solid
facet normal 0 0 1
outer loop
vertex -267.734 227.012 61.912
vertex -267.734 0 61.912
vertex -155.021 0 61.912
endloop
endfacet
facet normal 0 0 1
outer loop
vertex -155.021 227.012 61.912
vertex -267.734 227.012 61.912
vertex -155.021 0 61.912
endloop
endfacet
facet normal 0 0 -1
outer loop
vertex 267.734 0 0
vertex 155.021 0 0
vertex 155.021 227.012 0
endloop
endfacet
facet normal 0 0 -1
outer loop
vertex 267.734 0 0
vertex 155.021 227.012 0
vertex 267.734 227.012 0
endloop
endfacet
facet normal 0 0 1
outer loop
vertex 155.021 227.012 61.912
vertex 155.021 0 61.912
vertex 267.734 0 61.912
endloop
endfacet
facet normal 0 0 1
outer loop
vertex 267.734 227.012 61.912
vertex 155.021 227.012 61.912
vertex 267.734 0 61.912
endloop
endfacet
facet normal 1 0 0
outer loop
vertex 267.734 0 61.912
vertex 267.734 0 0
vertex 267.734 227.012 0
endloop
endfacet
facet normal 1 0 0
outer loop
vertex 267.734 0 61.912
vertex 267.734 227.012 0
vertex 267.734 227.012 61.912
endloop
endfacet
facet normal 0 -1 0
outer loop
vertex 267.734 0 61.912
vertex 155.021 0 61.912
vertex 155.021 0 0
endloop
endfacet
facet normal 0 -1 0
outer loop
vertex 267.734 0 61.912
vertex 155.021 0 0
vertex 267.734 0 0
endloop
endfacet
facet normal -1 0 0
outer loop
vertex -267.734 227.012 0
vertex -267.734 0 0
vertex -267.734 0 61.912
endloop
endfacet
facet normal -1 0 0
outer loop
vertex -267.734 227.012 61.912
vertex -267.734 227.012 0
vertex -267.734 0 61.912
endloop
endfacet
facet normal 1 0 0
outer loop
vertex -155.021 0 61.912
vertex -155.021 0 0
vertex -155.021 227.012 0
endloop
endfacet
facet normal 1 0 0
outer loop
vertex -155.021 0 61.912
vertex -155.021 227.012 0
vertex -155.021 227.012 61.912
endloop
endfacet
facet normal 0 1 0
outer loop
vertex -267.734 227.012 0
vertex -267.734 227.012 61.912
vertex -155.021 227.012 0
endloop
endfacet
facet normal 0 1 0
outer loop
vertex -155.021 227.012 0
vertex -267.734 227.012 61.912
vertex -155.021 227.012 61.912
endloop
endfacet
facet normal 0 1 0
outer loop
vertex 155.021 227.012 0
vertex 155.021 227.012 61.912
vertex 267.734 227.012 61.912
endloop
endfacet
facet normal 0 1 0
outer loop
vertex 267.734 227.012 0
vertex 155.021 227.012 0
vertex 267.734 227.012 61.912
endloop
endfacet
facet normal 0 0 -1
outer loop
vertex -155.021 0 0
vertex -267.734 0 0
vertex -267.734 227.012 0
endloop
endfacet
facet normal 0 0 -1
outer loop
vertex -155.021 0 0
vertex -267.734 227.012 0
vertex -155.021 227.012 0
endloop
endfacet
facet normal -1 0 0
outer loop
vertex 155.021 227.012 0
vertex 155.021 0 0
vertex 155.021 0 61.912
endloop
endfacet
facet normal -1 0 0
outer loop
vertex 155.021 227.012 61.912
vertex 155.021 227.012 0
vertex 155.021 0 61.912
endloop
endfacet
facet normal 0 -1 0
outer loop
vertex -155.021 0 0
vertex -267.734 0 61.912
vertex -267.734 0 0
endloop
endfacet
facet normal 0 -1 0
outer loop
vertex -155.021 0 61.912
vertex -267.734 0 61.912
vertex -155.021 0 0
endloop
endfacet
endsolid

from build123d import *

# Parameters (mm, degrees)
F0_W     = 112.7125
F0_H     = 61.9125
F1_DEPTH = 227.0125


with BuildPart() as f1:
    # F0 (on Front) → F1 (new body)
    with BuildSketch(Plane.XZ):
        with Locations((211.377581, 30.95625)):
            Rectangle(F0_W, F0_H)
        with Locations((-211.377581, 30.95625)):
            Rectangle(F0_W, F0_H)
    extrude(amount=-F1_DEPTH)


solid = f1.part
